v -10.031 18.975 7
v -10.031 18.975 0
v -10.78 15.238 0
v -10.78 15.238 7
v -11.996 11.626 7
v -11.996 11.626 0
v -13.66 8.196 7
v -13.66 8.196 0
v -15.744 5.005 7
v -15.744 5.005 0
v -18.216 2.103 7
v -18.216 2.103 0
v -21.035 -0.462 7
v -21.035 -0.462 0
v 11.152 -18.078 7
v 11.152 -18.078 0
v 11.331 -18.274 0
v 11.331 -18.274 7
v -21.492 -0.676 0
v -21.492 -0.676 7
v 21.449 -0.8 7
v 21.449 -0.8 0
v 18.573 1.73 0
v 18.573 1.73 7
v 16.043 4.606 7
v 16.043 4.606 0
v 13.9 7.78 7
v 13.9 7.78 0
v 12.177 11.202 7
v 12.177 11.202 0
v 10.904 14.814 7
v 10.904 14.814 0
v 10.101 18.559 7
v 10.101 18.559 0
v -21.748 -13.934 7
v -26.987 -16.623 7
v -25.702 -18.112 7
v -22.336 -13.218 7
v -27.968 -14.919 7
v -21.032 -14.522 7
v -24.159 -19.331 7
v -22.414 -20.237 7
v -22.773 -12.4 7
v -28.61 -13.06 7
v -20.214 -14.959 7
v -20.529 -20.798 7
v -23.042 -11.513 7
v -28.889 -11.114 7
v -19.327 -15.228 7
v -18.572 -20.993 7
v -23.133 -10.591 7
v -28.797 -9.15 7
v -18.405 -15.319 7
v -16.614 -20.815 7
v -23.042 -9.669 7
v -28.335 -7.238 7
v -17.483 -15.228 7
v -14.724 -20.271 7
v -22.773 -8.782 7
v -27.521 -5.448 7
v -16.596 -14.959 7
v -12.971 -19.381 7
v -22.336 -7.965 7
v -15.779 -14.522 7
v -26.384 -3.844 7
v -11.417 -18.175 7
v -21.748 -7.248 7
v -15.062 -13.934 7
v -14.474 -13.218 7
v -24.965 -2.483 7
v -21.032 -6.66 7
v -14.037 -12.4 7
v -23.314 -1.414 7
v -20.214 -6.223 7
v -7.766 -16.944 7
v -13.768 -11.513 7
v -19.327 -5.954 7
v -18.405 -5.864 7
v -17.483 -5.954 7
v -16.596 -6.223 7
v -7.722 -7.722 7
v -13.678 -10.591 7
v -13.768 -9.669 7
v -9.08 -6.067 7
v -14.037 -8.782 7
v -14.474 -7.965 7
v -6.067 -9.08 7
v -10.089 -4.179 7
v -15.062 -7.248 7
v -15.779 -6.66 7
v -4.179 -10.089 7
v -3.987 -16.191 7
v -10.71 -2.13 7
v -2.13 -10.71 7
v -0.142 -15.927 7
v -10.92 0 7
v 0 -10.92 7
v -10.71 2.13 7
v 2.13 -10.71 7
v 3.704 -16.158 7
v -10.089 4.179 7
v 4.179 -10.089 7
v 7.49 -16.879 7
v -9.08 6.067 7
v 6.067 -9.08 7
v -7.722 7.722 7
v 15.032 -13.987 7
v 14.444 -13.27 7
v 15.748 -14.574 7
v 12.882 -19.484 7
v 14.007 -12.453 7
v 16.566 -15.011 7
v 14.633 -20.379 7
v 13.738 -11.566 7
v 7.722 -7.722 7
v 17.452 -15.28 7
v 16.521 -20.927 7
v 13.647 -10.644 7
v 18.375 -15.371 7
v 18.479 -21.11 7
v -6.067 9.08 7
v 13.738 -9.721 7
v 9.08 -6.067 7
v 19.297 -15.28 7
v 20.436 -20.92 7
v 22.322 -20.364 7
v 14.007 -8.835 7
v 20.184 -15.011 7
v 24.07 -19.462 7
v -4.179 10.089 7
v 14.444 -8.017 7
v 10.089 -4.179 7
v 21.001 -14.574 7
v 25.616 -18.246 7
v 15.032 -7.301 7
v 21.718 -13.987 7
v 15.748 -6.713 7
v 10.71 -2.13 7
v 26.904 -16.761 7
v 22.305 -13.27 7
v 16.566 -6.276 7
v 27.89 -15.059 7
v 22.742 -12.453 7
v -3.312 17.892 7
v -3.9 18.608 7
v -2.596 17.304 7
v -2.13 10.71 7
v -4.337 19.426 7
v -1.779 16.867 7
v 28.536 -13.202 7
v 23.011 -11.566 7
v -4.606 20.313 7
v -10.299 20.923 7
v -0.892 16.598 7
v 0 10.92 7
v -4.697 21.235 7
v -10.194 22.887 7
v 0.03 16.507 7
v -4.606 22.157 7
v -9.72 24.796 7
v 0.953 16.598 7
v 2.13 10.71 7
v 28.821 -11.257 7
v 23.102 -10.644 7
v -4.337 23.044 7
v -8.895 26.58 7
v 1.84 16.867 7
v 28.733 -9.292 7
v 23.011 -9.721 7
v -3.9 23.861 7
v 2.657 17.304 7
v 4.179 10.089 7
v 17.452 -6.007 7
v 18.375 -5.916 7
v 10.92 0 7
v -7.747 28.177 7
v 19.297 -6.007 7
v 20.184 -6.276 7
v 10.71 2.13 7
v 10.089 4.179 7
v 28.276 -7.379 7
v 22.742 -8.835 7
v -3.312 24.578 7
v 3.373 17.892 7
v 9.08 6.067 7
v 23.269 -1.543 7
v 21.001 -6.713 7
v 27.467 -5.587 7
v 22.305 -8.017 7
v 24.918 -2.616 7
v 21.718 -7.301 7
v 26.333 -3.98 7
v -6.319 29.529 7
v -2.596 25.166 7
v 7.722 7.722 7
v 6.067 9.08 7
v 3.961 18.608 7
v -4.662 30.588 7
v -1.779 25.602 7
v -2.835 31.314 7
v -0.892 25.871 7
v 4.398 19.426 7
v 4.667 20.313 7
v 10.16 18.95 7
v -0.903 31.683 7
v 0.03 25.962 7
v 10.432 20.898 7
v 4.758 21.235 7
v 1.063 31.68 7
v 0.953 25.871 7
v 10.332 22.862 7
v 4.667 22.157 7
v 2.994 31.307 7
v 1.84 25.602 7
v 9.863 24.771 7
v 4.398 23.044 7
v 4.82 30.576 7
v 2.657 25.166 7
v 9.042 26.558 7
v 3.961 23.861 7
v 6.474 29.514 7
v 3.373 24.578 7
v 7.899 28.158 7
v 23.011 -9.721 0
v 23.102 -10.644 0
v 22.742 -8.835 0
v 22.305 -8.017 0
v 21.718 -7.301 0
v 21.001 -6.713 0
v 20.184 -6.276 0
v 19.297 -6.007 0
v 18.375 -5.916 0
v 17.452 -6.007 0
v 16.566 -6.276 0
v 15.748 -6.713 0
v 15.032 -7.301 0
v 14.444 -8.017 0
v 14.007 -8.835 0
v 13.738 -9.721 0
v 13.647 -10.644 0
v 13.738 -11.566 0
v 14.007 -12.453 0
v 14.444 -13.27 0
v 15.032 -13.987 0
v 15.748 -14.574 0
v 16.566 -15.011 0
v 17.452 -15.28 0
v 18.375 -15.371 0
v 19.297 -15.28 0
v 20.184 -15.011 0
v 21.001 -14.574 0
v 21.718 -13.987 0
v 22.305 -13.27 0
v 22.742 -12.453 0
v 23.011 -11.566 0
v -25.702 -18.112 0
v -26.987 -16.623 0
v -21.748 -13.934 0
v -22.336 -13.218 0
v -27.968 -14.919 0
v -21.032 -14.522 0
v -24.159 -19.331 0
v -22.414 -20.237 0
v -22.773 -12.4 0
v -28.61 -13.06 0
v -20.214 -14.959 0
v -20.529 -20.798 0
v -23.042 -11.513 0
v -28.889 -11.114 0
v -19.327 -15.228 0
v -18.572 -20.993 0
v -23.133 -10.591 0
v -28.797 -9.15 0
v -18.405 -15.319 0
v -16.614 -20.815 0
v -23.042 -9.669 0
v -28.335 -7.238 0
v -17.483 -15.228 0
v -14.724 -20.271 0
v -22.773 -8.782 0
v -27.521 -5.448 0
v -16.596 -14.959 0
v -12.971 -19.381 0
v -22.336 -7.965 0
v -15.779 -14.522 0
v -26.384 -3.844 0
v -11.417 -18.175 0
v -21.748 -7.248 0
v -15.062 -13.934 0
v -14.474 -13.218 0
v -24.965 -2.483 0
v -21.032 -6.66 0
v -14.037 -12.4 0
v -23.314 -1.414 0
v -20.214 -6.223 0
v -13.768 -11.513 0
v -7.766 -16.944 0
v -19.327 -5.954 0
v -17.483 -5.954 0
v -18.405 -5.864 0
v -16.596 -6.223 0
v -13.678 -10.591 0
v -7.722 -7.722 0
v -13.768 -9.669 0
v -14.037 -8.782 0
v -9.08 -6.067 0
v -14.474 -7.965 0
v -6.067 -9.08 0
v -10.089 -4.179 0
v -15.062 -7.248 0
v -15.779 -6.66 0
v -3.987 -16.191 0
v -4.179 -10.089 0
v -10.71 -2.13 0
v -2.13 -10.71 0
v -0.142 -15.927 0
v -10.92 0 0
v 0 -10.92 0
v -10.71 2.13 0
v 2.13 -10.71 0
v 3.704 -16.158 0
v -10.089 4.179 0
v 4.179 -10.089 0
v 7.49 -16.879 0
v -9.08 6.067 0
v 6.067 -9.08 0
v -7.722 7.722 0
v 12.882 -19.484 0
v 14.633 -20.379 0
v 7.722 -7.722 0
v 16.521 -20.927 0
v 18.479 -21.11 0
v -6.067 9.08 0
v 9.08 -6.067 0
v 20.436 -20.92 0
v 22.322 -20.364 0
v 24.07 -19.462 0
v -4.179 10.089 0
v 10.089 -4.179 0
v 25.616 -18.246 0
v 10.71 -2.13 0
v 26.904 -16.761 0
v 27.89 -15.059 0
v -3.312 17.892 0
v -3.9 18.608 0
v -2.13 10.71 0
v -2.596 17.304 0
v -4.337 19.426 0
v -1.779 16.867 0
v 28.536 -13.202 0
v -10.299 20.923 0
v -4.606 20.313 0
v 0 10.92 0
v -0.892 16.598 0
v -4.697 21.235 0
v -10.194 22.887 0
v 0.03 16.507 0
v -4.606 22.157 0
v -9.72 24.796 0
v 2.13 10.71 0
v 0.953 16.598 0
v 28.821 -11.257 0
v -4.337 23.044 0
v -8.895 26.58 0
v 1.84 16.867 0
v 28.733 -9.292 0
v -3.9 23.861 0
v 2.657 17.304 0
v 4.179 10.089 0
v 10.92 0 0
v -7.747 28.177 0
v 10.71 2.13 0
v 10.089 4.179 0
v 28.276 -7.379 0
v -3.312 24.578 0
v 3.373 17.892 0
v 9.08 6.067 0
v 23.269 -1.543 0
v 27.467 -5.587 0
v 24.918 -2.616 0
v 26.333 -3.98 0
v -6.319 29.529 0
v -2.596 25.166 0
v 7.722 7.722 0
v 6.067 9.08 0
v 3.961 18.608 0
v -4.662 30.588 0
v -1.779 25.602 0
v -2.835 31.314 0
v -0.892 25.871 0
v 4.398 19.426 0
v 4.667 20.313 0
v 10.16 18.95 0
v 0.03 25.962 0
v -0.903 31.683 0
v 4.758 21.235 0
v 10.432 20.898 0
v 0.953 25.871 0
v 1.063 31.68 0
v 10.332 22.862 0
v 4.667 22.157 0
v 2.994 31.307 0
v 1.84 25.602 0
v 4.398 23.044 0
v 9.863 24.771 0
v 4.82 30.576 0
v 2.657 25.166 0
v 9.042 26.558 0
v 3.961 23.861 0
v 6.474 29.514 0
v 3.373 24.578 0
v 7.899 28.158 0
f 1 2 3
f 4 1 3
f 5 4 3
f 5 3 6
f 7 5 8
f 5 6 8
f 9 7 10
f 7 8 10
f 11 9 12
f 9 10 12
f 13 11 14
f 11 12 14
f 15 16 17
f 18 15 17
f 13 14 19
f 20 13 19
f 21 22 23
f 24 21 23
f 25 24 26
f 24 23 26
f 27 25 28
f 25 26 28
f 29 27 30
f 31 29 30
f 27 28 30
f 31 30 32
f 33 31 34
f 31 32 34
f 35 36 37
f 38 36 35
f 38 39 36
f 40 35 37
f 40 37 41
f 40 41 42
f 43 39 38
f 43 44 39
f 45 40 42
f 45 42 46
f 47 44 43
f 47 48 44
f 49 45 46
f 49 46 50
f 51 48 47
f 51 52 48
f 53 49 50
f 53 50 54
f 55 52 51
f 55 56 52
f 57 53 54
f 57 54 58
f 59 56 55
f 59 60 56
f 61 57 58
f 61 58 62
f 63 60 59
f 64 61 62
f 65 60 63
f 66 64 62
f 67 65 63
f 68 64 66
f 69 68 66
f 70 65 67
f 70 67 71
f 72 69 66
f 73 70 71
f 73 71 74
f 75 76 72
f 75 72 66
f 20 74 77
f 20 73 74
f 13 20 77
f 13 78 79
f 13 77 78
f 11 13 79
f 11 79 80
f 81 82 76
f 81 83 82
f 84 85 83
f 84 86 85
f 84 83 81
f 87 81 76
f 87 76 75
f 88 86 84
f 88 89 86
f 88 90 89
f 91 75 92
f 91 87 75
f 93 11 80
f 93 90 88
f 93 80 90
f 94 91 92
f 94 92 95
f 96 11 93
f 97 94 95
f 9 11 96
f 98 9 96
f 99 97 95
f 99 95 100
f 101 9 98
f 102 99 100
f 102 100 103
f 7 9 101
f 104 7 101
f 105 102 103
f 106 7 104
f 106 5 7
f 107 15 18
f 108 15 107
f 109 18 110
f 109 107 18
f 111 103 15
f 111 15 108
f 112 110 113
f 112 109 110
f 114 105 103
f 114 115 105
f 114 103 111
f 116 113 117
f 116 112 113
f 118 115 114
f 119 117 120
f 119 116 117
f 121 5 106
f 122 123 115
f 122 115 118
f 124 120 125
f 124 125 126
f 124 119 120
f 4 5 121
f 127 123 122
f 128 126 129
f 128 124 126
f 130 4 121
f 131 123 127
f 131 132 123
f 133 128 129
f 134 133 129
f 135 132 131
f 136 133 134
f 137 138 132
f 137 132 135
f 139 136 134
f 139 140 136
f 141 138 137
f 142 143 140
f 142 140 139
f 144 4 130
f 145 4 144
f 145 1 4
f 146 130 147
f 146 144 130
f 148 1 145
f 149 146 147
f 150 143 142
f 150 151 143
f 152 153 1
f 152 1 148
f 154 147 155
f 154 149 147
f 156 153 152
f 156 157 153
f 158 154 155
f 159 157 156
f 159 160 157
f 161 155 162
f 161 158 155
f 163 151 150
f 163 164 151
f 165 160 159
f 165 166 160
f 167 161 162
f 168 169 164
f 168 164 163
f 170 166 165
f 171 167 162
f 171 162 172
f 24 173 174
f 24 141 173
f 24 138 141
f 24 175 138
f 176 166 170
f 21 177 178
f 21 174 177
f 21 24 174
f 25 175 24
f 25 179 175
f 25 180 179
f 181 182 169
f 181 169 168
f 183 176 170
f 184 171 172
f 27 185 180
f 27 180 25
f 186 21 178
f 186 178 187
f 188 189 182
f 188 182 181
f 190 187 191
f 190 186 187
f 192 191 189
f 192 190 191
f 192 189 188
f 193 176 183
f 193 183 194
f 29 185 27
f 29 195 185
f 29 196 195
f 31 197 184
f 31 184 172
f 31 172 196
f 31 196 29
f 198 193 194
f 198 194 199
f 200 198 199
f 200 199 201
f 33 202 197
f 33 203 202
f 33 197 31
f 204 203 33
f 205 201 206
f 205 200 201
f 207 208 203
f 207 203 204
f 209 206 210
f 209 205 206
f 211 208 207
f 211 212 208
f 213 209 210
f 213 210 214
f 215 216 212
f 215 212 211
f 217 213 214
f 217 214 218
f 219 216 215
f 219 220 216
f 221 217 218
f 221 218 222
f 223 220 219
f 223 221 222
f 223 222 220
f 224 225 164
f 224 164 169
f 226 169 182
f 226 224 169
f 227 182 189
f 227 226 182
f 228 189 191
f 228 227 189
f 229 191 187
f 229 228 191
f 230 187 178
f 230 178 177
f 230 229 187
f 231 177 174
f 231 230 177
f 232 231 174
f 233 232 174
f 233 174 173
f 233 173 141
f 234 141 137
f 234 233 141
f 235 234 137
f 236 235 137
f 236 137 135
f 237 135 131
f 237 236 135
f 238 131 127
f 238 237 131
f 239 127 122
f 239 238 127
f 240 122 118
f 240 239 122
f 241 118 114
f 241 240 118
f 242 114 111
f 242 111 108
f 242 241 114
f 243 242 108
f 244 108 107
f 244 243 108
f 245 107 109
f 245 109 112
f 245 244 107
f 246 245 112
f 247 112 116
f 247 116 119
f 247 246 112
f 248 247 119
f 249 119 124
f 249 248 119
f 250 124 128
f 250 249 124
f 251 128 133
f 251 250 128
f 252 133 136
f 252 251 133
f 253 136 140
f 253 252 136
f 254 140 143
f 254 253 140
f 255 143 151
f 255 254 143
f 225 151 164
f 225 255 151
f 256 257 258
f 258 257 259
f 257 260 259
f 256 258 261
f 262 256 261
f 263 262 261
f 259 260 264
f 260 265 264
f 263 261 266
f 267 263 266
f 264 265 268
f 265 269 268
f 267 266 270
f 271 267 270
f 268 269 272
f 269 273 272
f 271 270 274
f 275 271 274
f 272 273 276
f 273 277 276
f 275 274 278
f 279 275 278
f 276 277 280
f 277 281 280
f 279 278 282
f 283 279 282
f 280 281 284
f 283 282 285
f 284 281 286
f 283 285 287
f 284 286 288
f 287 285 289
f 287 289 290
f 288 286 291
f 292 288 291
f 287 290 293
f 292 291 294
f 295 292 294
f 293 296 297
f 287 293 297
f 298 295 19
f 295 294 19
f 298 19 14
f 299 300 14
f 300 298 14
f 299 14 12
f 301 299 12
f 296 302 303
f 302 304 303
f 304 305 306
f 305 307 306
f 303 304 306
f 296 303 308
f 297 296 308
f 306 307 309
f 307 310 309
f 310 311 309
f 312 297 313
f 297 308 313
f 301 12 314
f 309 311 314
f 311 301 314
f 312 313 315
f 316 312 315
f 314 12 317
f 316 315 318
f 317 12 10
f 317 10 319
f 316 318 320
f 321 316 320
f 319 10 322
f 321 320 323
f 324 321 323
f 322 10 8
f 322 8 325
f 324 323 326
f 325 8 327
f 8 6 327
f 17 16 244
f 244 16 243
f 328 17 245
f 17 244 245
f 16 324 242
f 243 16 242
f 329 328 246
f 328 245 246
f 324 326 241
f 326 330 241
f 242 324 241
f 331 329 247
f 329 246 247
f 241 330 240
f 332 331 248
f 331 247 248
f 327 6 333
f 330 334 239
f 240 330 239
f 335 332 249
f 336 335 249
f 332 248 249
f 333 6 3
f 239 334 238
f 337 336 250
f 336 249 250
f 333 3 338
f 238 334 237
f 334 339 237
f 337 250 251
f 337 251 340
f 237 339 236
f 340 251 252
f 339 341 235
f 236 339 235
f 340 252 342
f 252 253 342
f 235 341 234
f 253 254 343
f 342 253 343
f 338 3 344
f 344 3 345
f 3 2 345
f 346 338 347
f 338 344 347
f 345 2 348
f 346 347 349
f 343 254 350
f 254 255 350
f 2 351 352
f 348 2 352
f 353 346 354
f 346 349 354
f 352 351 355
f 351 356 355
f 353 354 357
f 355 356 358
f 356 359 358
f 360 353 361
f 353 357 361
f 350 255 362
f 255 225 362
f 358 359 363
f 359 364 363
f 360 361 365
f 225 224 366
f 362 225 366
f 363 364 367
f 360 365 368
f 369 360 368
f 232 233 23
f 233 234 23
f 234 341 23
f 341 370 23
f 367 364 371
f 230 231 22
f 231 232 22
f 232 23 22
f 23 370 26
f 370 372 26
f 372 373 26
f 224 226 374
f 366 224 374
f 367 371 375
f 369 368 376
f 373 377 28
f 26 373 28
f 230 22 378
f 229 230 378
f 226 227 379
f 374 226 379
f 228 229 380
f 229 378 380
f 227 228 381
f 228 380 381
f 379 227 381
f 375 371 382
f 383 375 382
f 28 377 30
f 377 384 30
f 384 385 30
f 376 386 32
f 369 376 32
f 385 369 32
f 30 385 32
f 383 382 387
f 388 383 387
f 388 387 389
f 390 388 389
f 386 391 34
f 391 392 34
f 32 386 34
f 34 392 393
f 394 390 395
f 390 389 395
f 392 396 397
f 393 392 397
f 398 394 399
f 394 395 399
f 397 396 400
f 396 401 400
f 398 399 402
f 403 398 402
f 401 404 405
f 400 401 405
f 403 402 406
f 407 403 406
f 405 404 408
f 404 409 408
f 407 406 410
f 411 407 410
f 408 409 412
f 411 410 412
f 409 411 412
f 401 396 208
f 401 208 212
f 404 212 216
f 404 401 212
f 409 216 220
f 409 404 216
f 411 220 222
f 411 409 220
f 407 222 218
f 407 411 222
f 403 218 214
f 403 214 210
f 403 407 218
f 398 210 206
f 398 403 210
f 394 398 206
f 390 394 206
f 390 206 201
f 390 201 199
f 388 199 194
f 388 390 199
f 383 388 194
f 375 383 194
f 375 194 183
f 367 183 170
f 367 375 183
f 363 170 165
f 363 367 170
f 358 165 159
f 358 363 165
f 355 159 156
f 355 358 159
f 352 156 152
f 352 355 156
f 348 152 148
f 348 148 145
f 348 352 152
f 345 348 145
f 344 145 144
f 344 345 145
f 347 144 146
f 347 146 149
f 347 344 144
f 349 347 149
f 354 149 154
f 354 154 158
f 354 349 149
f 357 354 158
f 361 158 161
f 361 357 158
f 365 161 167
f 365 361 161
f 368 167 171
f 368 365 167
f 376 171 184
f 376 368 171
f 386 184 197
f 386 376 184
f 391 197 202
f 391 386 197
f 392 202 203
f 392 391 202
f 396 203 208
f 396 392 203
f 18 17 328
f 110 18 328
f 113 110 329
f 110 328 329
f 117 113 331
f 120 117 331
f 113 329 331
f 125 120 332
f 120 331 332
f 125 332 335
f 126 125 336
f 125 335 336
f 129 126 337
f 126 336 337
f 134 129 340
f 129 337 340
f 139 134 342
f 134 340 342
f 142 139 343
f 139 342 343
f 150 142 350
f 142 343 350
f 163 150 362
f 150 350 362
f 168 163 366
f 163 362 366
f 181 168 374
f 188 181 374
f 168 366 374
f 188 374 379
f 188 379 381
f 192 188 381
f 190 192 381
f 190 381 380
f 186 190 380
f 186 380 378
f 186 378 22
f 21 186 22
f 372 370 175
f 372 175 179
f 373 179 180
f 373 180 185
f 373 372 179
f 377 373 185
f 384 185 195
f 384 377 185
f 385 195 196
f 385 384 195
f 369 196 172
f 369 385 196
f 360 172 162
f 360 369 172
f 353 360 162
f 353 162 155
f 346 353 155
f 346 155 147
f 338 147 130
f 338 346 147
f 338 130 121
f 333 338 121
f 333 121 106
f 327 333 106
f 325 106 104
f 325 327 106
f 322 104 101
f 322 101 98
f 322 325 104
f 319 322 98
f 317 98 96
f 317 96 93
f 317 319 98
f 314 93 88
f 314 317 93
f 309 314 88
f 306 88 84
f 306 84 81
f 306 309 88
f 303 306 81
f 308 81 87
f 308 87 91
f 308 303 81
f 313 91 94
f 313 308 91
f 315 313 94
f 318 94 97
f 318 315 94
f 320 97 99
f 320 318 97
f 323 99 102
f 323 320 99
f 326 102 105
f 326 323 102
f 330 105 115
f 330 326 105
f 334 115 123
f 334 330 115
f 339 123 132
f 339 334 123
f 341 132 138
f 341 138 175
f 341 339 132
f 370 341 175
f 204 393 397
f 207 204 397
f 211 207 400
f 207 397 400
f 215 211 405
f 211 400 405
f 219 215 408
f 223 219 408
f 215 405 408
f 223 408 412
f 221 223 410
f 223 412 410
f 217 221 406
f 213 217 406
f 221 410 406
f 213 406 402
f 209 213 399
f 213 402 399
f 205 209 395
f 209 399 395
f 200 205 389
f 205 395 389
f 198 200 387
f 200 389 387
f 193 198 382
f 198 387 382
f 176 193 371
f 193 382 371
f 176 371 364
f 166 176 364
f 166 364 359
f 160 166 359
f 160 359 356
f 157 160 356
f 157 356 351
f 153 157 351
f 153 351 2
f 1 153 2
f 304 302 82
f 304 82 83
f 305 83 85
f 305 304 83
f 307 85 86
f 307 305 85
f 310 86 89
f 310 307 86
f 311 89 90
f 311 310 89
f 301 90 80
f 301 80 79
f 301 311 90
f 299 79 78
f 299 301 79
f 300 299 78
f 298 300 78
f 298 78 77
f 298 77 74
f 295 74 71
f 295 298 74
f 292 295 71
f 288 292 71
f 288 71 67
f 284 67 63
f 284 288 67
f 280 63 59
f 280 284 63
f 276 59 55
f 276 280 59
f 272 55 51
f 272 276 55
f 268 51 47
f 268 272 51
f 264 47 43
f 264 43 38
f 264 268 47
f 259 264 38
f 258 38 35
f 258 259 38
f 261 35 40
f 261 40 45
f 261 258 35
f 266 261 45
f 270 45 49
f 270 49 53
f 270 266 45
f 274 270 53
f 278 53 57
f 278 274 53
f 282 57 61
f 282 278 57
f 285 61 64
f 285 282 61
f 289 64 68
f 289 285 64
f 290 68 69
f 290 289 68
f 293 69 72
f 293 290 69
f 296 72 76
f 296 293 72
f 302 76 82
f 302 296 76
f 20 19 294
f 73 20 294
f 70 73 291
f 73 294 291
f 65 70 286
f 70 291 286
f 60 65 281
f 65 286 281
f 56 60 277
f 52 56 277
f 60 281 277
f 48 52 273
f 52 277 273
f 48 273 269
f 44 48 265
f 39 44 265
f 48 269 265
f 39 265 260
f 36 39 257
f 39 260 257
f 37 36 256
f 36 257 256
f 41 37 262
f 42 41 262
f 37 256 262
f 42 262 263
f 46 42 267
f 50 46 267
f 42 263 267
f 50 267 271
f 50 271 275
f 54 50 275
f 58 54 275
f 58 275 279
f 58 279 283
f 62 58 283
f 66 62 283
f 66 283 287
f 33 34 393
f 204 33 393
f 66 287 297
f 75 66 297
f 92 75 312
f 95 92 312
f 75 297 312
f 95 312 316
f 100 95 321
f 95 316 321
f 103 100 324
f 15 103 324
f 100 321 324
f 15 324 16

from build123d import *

# Parameters (mm, degrees)
F0_R     = 10.92
F0_R_2   = 4.7275
F1_DEPTH = 7


with BuildPart() as f1:
    # F0 (on Top) → F1 (new body)
    with BuildSketch(Plane.XY):
        Circle(F0_R)
        with BuildLine():
            Line((11.151573, -18.07834), (11.331202, -18.274194))
            ThreePointArc((11.331202, -18.274194), (27.437316, -15.933644), (21.448669, -0.800199))
            ThreePointArc((21.448669, -0.800199), (13.899631, 7.78037), (10.100635, 18.559135))
            Line((10.100635, 18.559135), (10.160315, 18.950206))
            ThreePointArc((10.160315, 18.950206), (0.080283, 31.728235), (-10.031342, 18.975192))
            ThreePointArc((-10.031342, 18.975192), (-13.660086, 8.19612), (-21.035123, -0.462112))
            Line((-21.035123, -0.462112), (-21.491517, -0.676012))
            ThreePointArc((-21.491517, -0.676012), (-27.517599, -15.79459), (-11.417327, -18.174993))
            ThreePointArc((-11.417327, -18.174993), (-0.142296, -15.92724), (11.151573, -18.07834))
        make_face()
        with Locations((-18.405074, -10.591076)):
            Circle(F0_R_2, mode=Mode.SUBTRACT)
        with Locations((18.374678, -10.643723)):
            Circle(F0_R_2, mode=Mode.SUBTRACT)
        Circle(F0_R, mode=Mode.SUBTRACT)
        with Locations((0.030396, 21.234799)):
            Circle(F0_R_2, mode=Mode.SUBTRACT)
    extrude(amount=F1_DEPTH)


solid = f1.part
